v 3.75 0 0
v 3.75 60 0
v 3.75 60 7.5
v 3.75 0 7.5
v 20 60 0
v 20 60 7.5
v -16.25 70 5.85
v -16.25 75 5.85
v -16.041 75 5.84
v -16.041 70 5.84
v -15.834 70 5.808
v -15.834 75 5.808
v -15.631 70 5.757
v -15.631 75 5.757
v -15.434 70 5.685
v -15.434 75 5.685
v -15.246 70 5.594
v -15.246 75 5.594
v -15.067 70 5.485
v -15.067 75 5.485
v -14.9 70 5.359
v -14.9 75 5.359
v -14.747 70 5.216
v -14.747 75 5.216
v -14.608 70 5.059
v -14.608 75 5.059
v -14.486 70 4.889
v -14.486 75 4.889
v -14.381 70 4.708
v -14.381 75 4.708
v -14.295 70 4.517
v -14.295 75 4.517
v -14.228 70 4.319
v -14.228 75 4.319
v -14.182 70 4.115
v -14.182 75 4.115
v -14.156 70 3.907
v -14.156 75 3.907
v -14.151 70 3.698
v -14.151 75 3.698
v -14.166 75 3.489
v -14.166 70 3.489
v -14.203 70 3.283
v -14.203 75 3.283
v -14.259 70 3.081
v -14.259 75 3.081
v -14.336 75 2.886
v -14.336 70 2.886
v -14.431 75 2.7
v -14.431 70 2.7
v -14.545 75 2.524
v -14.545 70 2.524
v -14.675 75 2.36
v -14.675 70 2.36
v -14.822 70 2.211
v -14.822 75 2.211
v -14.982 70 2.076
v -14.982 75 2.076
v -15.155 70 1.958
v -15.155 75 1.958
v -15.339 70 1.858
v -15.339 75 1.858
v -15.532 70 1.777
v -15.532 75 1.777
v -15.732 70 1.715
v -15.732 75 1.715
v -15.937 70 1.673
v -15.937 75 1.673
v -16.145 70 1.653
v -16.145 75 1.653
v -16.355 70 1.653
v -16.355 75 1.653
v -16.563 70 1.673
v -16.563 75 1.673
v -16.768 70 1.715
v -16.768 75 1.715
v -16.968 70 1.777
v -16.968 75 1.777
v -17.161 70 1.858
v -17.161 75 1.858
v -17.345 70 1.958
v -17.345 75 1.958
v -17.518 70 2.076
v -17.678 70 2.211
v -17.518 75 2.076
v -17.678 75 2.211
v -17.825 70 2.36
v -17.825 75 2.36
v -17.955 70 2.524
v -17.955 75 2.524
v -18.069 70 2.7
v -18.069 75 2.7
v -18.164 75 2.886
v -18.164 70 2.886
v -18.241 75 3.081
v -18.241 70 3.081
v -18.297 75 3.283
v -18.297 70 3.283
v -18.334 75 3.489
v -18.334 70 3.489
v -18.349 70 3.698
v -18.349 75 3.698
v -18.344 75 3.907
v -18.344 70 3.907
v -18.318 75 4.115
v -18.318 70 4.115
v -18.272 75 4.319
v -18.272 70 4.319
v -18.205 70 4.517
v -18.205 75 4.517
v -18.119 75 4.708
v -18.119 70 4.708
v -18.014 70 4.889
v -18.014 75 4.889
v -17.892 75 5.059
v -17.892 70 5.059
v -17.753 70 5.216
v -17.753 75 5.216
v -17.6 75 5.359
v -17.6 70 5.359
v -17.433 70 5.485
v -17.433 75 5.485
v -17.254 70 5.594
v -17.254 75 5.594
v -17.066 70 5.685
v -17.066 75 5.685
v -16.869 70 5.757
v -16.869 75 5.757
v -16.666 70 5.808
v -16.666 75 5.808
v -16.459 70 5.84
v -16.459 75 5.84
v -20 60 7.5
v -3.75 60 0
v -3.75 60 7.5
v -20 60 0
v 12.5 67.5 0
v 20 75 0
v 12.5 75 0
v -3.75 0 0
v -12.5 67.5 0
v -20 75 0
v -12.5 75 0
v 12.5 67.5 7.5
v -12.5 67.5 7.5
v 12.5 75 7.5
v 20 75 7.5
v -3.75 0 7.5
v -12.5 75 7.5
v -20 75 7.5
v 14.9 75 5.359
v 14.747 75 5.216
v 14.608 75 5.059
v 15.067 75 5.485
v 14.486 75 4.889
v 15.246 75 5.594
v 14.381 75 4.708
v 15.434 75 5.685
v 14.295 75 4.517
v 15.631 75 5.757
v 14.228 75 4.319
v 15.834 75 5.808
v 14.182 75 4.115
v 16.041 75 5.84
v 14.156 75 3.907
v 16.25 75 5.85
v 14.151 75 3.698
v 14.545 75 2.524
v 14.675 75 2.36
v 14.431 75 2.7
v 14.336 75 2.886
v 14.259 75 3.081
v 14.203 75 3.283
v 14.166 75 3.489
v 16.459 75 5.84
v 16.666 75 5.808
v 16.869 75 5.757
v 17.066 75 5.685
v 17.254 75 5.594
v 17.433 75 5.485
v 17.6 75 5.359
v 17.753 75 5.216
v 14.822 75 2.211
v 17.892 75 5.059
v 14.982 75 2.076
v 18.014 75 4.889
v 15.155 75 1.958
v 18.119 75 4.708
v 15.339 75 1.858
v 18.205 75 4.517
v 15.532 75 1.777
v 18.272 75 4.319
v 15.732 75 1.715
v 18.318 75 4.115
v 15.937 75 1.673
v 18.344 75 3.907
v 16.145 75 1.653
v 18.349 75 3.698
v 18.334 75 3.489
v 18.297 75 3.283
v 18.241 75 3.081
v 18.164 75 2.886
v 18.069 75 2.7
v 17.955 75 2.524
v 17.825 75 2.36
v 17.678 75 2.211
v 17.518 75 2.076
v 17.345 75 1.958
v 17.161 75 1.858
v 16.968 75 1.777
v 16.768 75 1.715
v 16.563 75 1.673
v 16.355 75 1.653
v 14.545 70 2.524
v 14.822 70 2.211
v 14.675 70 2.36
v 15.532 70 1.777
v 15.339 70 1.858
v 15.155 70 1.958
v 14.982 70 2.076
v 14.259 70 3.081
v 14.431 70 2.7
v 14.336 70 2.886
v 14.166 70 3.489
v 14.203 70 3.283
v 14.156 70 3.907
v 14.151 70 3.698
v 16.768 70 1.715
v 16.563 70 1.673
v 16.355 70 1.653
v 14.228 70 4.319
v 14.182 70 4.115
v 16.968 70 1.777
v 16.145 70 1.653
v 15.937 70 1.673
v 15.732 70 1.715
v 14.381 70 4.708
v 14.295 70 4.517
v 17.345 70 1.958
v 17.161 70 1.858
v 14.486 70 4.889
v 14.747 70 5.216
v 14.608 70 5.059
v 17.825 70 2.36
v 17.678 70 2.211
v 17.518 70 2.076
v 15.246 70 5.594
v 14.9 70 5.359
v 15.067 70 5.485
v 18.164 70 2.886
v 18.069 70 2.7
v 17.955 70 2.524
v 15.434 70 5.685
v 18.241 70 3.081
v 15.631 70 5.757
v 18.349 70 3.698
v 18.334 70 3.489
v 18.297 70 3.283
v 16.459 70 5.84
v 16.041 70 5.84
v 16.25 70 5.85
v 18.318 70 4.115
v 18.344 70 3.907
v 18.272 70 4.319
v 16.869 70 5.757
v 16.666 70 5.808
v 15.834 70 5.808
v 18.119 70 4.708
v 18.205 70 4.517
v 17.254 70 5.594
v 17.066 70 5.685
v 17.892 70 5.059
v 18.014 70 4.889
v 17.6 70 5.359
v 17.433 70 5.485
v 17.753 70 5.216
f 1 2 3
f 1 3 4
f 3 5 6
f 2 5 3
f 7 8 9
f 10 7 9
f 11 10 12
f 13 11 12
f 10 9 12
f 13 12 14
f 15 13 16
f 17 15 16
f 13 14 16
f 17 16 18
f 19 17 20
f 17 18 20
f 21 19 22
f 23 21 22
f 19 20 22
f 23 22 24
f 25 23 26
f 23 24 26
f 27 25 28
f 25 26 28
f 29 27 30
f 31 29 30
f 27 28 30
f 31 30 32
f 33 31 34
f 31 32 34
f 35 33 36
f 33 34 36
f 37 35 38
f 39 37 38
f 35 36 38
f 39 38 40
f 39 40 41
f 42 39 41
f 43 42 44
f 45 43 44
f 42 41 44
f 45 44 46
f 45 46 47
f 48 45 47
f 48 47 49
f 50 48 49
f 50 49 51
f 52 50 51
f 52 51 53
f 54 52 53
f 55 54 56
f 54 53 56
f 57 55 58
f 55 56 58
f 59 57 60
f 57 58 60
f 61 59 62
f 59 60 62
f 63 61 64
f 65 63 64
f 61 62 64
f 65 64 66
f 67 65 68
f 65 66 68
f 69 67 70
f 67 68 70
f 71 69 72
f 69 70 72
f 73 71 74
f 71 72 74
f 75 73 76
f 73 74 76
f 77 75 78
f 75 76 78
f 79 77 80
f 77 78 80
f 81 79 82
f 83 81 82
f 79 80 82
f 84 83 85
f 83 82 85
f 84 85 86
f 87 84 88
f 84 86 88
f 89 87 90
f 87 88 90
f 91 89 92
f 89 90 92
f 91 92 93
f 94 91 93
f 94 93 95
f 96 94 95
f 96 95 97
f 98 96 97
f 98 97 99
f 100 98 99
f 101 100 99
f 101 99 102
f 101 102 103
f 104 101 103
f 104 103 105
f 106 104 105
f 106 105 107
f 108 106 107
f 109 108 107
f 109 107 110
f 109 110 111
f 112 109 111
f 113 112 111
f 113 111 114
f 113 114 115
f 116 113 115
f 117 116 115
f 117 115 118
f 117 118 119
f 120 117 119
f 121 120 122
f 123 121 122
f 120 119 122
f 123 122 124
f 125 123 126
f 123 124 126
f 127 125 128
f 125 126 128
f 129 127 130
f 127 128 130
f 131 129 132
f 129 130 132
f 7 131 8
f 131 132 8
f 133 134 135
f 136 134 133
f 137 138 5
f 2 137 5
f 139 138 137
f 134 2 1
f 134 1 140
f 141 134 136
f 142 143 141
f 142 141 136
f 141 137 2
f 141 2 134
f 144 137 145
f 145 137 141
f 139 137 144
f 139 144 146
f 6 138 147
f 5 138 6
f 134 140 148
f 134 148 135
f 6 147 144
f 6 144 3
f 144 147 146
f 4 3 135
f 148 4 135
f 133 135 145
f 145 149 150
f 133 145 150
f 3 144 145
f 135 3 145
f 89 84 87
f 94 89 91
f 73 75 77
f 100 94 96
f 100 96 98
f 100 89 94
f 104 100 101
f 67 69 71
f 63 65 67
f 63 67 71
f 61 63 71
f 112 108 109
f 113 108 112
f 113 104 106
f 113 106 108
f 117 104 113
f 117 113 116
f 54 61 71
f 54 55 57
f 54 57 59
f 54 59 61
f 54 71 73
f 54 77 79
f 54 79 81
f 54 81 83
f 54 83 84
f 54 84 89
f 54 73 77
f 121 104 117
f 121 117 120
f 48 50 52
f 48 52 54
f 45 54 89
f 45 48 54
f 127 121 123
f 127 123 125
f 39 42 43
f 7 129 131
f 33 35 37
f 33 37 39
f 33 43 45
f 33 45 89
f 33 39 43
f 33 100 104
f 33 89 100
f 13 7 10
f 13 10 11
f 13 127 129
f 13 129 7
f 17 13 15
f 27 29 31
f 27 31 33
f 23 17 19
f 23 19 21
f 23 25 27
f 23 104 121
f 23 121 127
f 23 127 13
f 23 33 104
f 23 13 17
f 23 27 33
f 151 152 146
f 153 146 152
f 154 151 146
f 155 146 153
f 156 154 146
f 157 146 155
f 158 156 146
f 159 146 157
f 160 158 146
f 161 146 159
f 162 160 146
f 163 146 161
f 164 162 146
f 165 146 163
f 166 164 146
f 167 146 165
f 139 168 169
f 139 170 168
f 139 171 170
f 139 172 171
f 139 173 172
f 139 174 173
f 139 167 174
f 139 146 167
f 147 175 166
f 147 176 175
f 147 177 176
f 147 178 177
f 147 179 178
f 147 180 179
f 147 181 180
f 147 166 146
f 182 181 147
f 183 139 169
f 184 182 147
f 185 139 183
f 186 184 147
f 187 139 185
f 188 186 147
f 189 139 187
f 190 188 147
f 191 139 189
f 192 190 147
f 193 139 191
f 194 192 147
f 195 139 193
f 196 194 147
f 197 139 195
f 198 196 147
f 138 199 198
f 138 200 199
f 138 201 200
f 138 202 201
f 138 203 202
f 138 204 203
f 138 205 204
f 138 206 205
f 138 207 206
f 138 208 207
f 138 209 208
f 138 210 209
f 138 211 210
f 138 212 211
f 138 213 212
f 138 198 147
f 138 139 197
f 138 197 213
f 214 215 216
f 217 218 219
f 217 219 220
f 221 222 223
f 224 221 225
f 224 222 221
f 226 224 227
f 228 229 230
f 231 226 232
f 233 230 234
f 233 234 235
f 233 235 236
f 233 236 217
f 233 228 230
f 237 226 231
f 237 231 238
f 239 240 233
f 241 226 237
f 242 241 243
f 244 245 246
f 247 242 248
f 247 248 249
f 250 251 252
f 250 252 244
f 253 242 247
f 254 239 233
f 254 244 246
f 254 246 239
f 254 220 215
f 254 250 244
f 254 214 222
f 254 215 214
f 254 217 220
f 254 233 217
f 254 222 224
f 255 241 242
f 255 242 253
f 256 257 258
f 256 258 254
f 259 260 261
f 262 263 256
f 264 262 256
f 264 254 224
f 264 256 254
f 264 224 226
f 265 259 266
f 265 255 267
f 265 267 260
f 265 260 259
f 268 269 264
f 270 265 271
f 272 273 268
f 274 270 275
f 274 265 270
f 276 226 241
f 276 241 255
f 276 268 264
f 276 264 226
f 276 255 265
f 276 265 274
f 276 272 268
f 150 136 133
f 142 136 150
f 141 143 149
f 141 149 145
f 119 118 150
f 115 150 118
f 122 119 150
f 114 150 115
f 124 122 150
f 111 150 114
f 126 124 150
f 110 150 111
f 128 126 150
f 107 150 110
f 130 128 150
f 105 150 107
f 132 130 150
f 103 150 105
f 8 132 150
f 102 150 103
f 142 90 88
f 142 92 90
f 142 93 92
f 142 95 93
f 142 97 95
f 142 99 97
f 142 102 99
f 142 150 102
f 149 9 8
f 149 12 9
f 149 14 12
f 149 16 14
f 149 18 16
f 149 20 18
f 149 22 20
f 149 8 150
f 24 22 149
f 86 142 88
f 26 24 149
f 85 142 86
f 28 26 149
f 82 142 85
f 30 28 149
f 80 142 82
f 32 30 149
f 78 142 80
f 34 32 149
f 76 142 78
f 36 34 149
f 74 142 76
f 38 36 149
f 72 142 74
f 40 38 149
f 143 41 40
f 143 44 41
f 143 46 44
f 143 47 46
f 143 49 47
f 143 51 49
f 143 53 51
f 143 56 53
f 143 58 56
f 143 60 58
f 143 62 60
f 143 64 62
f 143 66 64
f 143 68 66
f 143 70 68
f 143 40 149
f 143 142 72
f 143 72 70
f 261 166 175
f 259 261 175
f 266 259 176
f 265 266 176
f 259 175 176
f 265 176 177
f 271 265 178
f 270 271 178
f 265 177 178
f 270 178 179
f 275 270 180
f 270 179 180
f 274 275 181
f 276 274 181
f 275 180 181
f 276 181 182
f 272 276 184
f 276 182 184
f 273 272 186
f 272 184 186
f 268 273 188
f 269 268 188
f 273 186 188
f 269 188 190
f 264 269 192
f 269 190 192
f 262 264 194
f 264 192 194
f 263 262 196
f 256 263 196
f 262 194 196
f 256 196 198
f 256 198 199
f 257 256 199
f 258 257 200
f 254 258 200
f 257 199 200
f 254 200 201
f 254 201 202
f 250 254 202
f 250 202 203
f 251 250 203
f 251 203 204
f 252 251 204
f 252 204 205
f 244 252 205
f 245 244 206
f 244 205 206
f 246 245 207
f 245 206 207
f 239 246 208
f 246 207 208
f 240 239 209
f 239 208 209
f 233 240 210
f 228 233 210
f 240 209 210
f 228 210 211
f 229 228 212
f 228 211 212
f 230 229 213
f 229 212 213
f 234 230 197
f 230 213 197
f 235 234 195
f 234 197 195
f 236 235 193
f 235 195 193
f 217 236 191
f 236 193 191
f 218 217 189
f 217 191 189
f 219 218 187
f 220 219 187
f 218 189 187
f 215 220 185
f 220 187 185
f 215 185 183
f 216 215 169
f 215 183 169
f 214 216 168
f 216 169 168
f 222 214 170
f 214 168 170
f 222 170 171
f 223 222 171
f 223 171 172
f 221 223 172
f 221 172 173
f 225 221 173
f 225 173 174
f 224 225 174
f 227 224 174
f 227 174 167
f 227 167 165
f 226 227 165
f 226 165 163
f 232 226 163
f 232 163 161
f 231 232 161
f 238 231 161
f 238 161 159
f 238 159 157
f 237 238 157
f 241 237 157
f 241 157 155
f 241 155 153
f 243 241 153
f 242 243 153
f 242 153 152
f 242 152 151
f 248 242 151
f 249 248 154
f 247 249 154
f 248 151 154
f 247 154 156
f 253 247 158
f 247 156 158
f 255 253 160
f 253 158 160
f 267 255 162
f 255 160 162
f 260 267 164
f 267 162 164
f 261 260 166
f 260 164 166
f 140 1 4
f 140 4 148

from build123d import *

# Parameters (mm, degrees)
BOSS_EXTRUDE1_DEPTH = 7.5
SKETCH3_R           = 2.1
CUT_EXTRUDE1_DEPTH  = 5


with BuildPart() as part:
    # Sketch1 → Boss-Extrude1 (new body)
    with BuildSketch(Plane.XY):
        Polygon((12.5, 75), (20, 75), (20, 60), (3.75, 60), (3.75, 0), (-3.75, 0), (-3.75, 60), (-20, 60), (-20, 75), (-12.5, 75), (-12.5, 67.5), (0, 67.5), (12.5, 67.5), align=None)
    extrude(amount=BOSS_EXTRUDE1_DEPTH)

    # Sketch3 → Cut-Extrude1 (cut)
    with BuildSketch(Plane(origin=(0, 75, 0), x_dir=(1, 0, 0), z_dir=(0, 1, 0))):
        with Locations(Location((-16.25, -3.75, 0), (0, 0, 270))):
            Circle(SKETCH3_R)
        with Locations(Location((16.25, -3.75, 0), (0, 0, 270))):
            Circle(SKETCH3_R)
    extrude(amount=-CUT_EXTRUDE1_DEPTH, mode=Mode.SUBTRACT)


solid = part.part
